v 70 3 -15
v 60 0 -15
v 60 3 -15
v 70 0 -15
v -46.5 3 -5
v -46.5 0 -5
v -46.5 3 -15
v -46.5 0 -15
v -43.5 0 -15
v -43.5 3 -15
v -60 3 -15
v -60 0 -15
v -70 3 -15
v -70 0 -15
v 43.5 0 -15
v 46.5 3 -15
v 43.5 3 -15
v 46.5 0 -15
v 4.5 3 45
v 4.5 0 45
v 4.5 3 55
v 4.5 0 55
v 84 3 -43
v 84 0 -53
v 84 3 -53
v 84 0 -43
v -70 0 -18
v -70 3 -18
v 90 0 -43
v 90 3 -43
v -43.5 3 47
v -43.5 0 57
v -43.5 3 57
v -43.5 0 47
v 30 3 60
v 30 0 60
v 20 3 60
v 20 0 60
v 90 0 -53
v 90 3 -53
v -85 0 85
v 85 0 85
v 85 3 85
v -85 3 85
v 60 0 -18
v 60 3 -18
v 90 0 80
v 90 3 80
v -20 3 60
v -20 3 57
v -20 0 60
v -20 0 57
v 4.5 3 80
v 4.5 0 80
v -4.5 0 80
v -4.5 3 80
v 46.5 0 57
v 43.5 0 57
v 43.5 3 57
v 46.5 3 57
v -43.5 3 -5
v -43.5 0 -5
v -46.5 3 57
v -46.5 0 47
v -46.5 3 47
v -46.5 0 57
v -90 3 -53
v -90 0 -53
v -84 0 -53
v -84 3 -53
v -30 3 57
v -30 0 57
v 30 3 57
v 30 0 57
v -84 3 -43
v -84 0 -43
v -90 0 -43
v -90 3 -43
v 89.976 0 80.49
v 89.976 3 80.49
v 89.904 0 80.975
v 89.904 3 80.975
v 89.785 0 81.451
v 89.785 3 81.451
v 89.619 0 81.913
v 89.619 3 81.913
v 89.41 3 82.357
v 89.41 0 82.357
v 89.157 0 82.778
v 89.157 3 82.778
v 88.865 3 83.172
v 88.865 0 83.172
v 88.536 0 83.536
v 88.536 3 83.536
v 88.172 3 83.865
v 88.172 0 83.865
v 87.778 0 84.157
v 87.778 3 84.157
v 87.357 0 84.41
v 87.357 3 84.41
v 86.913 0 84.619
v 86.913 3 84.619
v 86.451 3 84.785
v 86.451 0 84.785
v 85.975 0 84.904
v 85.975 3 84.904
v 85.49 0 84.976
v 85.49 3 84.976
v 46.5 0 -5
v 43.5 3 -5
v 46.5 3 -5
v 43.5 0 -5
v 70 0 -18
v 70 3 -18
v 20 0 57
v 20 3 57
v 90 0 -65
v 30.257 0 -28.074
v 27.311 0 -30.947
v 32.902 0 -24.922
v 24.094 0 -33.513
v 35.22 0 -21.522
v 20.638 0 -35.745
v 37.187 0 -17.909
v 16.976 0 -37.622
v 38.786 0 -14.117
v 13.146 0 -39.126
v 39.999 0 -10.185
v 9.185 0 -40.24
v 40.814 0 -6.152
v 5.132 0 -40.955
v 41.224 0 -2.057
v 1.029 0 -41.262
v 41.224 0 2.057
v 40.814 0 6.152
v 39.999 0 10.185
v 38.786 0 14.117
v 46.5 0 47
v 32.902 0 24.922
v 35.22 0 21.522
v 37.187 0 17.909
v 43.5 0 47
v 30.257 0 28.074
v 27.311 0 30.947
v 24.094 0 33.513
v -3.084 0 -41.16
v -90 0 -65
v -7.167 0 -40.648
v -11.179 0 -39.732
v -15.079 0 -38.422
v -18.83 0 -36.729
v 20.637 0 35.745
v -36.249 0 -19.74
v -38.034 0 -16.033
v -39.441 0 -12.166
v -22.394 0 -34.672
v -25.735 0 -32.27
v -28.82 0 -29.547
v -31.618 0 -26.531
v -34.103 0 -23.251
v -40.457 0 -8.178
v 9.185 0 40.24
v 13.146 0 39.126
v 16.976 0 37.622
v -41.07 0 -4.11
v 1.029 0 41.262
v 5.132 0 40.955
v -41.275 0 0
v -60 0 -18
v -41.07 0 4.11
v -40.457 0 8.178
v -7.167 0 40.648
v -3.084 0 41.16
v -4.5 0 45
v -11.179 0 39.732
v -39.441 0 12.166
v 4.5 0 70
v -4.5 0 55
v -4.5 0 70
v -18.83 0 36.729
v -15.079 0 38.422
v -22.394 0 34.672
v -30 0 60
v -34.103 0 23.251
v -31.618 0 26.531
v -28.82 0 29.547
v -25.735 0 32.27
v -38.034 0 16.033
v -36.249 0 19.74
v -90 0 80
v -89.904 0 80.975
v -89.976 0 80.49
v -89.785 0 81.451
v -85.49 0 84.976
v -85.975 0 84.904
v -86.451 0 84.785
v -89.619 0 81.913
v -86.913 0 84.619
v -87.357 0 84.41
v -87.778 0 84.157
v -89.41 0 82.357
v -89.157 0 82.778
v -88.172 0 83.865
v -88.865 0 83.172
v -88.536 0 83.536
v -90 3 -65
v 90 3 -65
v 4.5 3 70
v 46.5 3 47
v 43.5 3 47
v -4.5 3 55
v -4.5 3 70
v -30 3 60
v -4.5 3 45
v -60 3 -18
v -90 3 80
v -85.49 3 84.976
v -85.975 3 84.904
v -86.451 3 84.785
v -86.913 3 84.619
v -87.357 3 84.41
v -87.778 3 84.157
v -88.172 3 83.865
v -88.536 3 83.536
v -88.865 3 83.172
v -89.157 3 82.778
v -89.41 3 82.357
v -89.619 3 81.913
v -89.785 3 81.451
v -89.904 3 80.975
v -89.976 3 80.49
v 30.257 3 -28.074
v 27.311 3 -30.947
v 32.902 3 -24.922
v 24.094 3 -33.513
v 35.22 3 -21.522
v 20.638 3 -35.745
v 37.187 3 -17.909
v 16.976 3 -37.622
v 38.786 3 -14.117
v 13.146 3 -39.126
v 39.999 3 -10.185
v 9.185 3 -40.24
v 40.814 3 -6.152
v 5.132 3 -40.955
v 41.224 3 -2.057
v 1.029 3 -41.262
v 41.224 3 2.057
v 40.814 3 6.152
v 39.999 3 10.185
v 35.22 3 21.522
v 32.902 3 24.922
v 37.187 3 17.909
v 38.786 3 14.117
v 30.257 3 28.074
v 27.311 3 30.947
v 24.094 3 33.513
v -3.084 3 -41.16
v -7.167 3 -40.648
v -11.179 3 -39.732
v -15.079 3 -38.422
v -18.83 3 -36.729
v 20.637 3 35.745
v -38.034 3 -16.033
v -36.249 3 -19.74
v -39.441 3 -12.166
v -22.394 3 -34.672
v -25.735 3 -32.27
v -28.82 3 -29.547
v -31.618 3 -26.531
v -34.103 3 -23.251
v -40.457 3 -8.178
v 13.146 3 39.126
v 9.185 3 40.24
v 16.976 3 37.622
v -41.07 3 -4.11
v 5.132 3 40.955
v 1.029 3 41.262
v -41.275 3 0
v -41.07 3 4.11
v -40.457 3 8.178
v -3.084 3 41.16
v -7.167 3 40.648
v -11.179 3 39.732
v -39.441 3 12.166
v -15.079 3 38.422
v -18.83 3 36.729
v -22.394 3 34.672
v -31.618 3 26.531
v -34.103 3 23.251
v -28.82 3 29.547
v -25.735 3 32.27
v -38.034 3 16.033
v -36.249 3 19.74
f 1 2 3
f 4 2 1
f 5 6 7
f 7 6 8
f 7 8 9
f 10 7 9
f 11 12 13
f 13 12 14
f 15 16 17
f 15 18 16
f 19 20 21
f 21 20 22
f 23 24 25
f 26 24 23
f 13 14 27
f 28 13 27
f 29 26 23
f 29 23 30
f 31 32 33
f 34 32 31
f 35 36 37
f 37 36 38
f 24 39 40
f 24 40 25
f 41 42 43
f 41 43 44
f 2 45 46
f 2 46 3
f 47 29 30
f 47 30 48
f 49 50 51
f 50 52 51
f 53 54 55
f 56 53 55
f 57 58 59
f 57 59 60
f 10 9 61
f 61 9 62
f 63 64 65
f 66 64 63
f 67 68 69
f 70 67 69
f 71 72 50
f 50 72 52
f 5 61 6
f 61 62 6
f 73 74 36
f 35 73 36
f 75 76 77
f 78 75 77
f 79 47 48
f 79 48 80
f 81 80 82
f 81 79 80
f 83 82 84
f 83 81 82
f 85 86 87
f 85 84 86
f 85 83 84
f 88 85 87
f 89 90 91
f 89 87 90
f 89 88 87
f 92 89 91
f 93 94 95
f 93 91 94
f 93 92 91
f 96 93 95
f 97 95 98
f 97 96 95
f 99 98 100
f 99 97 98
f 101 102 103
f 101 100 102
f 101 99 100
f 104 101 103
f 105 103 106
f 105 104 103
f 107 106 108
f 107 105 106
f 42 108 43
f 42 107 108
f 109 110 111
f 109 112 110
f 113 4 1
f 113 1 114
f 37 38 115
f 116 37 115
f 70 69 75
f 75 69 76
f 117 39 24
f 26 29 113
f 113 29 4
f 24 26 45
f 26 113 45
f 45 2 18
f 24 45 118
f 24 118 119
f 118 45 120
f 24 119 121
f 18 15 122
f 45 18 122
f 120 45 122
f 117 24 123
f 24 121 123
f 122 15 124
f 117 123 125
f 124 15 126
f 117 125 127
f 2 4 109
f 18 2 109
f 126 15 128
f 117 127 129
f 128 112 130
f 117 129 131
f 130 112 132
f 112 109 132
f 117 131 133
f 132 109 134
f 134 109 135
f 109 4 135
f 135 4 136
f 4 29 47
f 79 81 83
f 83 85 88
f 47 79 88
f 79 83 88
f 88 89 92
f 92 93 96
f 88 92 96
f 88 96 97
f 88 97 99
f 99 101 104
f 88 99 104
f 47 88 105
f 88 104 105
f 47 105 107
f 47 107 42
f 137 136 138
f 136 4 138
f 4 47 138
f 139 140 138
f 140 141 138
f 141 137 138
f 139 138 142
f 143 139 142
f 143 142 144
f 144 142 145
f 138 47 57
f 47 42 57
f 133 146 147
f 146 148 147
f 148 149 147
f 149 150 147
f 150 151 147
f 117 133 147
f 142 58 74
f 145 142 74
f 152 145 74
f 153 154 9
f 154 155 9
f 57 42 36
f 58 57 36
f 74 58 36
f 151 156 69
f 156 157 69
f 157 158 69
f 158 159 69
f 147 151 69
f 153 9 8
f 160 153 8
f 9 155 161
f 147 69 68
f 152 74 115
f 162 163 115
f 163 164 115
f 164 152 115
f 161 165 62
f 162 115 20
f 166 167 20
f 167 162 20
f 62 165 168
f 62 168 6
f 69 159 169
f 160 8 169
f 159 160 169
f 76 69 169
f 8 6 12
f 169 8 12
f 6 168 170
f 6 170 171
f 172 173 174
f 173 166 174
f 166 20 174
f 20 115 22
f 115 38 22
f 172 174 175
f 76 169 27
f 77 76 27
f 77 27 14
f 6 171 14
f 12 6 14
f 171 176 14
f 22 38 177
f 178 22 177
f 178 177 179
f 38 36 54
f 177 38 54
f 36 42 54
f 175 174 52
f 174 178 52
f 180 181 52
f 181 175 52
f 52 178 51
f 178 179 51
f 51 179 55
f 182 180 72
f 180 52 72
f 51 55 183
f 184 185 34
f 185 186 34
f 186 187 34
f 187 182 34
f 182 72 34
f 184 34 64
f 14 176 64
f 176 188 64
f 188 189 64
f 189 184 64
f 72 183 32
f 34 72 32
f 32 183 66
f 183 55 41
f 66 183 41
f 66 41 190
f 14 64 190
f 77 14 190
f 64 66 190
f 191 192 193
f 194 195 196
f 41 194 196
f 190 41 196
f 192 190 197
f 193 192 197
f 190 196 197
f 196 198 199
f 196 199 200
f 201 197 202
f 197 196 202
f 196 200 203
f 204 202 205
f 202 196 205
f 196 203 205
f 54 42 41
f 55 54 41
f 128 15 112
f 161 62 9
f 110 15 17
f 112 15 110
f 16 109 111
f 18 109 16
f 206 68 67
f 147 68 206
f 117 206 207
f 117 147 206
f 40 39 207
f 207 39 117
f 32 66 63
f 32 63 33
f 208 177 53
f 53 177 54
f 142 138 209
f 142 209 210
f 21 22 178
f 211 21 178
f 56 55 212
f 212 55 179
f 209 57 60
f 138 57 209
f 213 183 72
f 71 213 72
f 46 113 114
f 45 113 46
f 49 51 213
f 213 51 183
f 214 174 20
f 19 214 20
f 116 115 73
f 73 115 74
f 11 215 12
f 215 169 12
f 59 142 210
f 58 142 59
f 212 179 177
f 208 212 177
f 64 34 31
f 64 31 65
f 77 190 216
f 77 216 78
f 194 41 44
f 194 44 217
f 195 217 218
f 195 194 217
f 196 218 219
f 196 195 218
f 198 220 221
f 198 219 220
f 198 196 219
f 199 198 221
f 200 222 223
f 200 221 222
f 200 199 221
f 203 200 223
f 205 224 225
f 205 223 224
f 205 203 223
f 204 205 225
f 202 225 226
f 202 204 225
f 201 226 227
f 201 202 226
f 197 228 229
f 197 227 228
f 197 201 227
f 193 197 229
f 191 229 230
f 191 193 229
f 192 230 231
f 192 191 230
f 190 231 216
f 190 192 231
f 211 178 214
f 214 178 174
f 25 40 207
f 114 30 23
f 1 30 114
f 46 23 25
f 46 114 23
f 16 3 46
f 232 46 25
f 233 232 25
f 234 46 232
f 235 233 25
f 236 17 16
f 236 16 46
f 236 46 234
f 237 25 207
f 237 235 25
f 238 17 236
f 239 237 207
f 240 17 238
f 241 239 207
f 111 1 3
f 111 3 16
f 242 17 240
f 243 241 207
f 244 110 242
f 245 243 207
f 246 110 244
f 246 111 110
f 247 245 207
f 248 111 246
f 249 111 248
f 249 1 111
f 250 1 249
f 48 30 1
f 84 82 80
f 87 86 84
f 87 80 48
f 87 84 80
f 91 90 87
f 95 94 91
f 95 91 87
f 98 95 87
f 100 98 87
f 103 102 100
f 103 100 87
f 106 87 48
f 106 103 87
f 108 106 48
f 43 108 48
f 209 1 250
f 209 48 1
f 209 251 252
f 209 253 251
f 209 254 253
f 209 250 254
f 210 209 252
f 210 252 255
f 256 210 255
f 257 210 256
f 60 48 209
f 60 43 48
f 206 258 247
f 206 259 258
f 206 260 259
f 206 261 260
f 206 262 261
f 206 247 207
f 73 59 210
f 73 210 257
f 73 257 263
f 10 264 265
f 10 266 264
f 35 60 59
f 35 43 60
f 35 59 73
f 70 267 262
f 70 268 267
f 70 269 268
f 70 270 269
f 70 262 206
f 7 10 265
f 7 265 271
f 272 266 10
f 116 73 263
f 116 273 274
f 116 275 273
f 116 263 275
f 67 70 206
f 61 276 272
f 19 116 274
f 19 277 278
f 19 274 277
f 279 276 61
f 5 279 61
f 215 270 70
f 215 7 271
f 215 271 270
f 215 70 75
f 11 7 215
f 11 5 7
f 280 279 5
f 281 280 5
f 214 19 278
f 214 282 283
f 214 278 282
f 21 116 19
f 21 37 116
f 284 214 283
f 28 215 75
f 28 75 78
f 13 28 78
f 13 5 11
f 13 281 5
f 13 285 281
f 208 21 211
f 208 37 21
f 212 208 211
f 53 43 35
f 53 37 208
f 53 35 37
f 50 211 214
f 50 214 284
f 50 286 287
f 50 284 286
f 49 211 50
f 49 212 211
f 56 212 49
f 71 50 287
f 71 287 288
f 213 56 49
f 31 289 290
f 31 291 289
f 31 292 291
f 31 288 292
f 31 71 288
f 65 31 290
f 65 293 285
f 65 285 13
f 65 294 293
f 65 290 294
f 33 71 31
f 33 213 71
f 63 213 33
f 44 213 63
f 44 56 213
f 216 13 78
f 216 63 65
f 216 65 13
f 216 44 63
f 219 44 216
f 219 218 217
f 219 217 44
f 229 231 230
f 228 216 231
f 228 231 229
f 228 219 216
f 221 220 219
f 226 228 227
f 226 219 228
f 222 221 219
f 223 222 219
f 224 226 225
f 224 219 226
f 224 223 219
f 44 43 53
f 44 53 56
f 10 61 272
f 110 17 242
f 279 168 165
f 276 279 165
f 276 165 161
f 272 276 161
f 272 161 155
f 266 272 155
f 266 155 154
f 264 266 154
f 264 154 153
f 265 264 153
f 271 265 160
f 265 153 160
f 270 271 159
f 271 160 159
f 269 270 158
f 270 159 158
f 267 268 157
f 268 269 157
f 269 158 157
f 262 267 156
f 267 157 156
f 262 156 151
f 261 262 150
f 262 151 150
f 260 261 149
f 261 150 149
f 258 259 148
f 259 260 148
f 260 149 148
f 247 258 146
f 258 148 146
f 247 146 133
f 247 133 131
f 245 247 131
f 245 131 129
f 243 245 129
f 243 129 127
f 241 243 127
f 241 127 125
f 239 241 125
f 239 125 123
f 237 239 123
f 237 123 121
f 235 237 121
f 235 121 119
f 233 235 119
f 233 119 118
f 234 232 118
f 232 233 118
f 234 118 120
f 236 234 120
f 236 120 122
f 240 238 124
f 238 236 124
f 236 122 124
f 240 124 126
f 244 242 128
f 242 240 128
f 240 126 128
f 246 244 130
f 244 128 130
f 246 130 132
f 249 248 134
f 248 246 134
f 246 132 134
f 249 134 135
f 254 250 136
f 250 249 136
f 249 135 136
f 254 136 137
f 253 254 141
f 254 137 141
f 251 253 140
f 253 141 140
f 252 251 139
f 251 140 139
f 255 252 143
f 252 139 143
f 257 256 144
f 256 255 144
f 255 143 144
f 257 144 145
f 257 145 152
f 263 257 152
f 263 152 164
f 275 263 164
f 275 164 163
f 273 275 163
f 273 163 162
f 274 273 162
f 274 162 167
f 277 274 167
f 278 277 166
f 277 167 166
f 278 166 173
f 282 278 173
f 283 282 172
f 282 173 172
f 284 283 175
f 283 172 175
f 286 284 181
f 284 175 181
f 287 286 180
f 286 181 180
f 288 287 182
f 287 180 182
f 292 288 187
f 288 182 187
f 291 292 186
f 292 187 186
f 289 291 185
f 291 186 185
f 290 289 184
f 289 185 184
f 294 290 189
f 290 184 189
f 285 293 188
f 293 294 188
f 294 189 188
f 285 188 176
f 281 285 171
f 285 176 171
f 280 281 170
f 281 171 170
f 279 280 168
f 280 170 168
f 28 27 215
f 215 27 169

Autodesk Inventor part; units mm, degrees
ref_plane "YZ Plane" through (0, 0, 0) normal (1, 0, 0) x (0, 1, 0)
ref_plane "XZ Plane" through (0, 0, 0) normal (0, 1, 0) x (-1, 0, 0)
ref_plane "XY Plane" through (0, 0, 0) normal (0, 0, 1) x (1, 0, 0)
sketch "Sketch2" plane through (0, 0, 0) normal (0, 1, 0) x (-1, 0, 0)
  line L0 (90, -53) -> (84, -53)
  line L1 (84, -53) -> (84, -43)
  line L2 (84, -43) -> (90, -43)
  line L3 (-90, -53) -> (-84, -53)
  line L4 (-84, -53) -> (-84, -43)
  line L5 (-84, -43) -> (-90, -43)
  line L6 (70, -18) -> (60, -18)
  line L7 (60, -18) -> (60, -15)
  line L8 (60, -15) -> (70, -15)
  line L9 (70, -15) -> (70, -18)
  line L10 (-70, -18) -> (-60, -18)
  line L11 (-60, -18) -> (-60, -15)
  line L12 (-60, -15) -> (-70, -15)
  line L13 (-70, -15) -> (-70, -18)
  circle A0 centre (0, 0) radius 41.275
  line L14 (46.5, -15) -> (43.5, -15)
  line L15 (43.5, -15) -> (43.5, -5)
  line L16 (43.5, -5) -> (46.5, -5)
  line L17 (46.5, -5) -> (46.5, -15)
  line L18 (-46.5, -15) -> (-43.5, -15)
  line L19 (-43.5, -15) -> (-43.5, -5)
  line L20 (-43.5, -5) -> (-46.5, -5)
  line L21 (-46.5, -5) -> (-46.5, -15)
  line L22 (43.5, 57) -> (43.5, 47)
  line L23 (43.5, 47) -> (46.5, 47)
  line L24 (46.5, 47) -> (46.5, 57)
  line L25 (-46.5, 47) -> (-43.5, 47)
  line L26 (-43.5, 47) -> (-43.5, 57)
  line L27 (-46.5, 57) -> (-46.5, 47)
  line L28 (-85, 85) -> (85, 85)
  arc A1 (-85, 85) -> (-90, 80) centre (-85, 80) ccw
  arc A2 (90, 80) -> (85, 85) centre (85, 80) ccw
  line L29 (46.5, 57) -> (43.5, 57)
  line L30 (-43.5, 57) -> (-46.5, 57)
  line L31 (30, 57) -> (20, 57)
  line L32 (20, 57) -> (20, 60)
  line L33 (20, 60) -> (30, 60)
  line L34 (30, 60) -> (30, 57)
  line L35 (-20, 57) -> (-30, 57)
  line L36 (-30, 57) -> (-30, 60)
  line L37 (-30, 60) -> (-20, 60)
  line L38 (-20, 60) -> (-20, 57)
  line L39 (4.5, 70) -> (-4.5, 70)
  line L40 (-4.5, 70) -> (-4.5, 80)
  line L41 (-4.5, 80) -> (4.5, 80)
  line L42 (4.5, 80) -> (4.5, 70)
  line L43 (4.5, 45) -> (-4.5, 45)
  line L44 (-4.5, 45) -> (-4.5, 55)
  line L45 (-4.5, 55) -> (4.5, 55)
  line L46 (4.5, 55) -> (4.5, 45)
  line L47 (-90, -43) -> (-90, 80)
  line L48 (90, 80) -> (90, -43)
  line L49 (90, -53) -> (90, -65)
  line L50 (-90, -53) -> (-90, -65)
  line L51 (90, -65) -> (-90, -65)
  point P0 (90, 85)
  dimension "d21" = 6
  dimension "d22" = 10
  dimension "d25" = 6
  dimension "d26" = 10
  dimension "d31" = 3
  dimension "d32" = 10
  dimension "d35" = 3
  dimension "d36" = 10
  dimension "d39" = 25
  dimension "d40" = 25
  dimension "d43" = 82.55
  dimension "d52" = 3
  dimension "d53" = 10
  dimension "d54" = 10
  dimension "d55" = 3
  dimension "d58" = 10
  dimension "d59" = 3
  dimension "d62" = 3
  dimension "d65" = 180
  dimension "d66" = 150
  dimension "d90" = 90
  dimension "d91" = 90
  dimension "d103" = 10
  dimension "d104" = 10
  dimension "d108" = 3
  dimension "d109" = 10
  dimension "d110" = 20
  dimension "d111" = 3
  dimension "d112" = 10
  dimension "d113" = 20
  dimension "d114" = 5
  dimension "d115" = 10
  dimension "d116" = 9
  dimension "d117" = 4.5
  dimension "d118" = 10
  dimension "d119" = 9
  dimension "d120" = 15
  dimension "d121" = 4.5
  dimension "d127" = 180
  dimension "d128" = 150
  dimension "d130" = 85.5
  dimension "d131" = 43.5
  dimension "d132" = 43.5
  dimension "d133" = 60
  dimension "d134" = 60
  dimension "d135" = 43.5
  dimension "d136" = 43.5
  dimension "d137" = 90
  dimension "d138" = 28
  dimension "d140" = 47
  dimension "d141" = 47
extrude "Extrusion6" add sketch "Sketch2" along normal blind 3
properties part number "OpenROV 2_3 Dev Top"
